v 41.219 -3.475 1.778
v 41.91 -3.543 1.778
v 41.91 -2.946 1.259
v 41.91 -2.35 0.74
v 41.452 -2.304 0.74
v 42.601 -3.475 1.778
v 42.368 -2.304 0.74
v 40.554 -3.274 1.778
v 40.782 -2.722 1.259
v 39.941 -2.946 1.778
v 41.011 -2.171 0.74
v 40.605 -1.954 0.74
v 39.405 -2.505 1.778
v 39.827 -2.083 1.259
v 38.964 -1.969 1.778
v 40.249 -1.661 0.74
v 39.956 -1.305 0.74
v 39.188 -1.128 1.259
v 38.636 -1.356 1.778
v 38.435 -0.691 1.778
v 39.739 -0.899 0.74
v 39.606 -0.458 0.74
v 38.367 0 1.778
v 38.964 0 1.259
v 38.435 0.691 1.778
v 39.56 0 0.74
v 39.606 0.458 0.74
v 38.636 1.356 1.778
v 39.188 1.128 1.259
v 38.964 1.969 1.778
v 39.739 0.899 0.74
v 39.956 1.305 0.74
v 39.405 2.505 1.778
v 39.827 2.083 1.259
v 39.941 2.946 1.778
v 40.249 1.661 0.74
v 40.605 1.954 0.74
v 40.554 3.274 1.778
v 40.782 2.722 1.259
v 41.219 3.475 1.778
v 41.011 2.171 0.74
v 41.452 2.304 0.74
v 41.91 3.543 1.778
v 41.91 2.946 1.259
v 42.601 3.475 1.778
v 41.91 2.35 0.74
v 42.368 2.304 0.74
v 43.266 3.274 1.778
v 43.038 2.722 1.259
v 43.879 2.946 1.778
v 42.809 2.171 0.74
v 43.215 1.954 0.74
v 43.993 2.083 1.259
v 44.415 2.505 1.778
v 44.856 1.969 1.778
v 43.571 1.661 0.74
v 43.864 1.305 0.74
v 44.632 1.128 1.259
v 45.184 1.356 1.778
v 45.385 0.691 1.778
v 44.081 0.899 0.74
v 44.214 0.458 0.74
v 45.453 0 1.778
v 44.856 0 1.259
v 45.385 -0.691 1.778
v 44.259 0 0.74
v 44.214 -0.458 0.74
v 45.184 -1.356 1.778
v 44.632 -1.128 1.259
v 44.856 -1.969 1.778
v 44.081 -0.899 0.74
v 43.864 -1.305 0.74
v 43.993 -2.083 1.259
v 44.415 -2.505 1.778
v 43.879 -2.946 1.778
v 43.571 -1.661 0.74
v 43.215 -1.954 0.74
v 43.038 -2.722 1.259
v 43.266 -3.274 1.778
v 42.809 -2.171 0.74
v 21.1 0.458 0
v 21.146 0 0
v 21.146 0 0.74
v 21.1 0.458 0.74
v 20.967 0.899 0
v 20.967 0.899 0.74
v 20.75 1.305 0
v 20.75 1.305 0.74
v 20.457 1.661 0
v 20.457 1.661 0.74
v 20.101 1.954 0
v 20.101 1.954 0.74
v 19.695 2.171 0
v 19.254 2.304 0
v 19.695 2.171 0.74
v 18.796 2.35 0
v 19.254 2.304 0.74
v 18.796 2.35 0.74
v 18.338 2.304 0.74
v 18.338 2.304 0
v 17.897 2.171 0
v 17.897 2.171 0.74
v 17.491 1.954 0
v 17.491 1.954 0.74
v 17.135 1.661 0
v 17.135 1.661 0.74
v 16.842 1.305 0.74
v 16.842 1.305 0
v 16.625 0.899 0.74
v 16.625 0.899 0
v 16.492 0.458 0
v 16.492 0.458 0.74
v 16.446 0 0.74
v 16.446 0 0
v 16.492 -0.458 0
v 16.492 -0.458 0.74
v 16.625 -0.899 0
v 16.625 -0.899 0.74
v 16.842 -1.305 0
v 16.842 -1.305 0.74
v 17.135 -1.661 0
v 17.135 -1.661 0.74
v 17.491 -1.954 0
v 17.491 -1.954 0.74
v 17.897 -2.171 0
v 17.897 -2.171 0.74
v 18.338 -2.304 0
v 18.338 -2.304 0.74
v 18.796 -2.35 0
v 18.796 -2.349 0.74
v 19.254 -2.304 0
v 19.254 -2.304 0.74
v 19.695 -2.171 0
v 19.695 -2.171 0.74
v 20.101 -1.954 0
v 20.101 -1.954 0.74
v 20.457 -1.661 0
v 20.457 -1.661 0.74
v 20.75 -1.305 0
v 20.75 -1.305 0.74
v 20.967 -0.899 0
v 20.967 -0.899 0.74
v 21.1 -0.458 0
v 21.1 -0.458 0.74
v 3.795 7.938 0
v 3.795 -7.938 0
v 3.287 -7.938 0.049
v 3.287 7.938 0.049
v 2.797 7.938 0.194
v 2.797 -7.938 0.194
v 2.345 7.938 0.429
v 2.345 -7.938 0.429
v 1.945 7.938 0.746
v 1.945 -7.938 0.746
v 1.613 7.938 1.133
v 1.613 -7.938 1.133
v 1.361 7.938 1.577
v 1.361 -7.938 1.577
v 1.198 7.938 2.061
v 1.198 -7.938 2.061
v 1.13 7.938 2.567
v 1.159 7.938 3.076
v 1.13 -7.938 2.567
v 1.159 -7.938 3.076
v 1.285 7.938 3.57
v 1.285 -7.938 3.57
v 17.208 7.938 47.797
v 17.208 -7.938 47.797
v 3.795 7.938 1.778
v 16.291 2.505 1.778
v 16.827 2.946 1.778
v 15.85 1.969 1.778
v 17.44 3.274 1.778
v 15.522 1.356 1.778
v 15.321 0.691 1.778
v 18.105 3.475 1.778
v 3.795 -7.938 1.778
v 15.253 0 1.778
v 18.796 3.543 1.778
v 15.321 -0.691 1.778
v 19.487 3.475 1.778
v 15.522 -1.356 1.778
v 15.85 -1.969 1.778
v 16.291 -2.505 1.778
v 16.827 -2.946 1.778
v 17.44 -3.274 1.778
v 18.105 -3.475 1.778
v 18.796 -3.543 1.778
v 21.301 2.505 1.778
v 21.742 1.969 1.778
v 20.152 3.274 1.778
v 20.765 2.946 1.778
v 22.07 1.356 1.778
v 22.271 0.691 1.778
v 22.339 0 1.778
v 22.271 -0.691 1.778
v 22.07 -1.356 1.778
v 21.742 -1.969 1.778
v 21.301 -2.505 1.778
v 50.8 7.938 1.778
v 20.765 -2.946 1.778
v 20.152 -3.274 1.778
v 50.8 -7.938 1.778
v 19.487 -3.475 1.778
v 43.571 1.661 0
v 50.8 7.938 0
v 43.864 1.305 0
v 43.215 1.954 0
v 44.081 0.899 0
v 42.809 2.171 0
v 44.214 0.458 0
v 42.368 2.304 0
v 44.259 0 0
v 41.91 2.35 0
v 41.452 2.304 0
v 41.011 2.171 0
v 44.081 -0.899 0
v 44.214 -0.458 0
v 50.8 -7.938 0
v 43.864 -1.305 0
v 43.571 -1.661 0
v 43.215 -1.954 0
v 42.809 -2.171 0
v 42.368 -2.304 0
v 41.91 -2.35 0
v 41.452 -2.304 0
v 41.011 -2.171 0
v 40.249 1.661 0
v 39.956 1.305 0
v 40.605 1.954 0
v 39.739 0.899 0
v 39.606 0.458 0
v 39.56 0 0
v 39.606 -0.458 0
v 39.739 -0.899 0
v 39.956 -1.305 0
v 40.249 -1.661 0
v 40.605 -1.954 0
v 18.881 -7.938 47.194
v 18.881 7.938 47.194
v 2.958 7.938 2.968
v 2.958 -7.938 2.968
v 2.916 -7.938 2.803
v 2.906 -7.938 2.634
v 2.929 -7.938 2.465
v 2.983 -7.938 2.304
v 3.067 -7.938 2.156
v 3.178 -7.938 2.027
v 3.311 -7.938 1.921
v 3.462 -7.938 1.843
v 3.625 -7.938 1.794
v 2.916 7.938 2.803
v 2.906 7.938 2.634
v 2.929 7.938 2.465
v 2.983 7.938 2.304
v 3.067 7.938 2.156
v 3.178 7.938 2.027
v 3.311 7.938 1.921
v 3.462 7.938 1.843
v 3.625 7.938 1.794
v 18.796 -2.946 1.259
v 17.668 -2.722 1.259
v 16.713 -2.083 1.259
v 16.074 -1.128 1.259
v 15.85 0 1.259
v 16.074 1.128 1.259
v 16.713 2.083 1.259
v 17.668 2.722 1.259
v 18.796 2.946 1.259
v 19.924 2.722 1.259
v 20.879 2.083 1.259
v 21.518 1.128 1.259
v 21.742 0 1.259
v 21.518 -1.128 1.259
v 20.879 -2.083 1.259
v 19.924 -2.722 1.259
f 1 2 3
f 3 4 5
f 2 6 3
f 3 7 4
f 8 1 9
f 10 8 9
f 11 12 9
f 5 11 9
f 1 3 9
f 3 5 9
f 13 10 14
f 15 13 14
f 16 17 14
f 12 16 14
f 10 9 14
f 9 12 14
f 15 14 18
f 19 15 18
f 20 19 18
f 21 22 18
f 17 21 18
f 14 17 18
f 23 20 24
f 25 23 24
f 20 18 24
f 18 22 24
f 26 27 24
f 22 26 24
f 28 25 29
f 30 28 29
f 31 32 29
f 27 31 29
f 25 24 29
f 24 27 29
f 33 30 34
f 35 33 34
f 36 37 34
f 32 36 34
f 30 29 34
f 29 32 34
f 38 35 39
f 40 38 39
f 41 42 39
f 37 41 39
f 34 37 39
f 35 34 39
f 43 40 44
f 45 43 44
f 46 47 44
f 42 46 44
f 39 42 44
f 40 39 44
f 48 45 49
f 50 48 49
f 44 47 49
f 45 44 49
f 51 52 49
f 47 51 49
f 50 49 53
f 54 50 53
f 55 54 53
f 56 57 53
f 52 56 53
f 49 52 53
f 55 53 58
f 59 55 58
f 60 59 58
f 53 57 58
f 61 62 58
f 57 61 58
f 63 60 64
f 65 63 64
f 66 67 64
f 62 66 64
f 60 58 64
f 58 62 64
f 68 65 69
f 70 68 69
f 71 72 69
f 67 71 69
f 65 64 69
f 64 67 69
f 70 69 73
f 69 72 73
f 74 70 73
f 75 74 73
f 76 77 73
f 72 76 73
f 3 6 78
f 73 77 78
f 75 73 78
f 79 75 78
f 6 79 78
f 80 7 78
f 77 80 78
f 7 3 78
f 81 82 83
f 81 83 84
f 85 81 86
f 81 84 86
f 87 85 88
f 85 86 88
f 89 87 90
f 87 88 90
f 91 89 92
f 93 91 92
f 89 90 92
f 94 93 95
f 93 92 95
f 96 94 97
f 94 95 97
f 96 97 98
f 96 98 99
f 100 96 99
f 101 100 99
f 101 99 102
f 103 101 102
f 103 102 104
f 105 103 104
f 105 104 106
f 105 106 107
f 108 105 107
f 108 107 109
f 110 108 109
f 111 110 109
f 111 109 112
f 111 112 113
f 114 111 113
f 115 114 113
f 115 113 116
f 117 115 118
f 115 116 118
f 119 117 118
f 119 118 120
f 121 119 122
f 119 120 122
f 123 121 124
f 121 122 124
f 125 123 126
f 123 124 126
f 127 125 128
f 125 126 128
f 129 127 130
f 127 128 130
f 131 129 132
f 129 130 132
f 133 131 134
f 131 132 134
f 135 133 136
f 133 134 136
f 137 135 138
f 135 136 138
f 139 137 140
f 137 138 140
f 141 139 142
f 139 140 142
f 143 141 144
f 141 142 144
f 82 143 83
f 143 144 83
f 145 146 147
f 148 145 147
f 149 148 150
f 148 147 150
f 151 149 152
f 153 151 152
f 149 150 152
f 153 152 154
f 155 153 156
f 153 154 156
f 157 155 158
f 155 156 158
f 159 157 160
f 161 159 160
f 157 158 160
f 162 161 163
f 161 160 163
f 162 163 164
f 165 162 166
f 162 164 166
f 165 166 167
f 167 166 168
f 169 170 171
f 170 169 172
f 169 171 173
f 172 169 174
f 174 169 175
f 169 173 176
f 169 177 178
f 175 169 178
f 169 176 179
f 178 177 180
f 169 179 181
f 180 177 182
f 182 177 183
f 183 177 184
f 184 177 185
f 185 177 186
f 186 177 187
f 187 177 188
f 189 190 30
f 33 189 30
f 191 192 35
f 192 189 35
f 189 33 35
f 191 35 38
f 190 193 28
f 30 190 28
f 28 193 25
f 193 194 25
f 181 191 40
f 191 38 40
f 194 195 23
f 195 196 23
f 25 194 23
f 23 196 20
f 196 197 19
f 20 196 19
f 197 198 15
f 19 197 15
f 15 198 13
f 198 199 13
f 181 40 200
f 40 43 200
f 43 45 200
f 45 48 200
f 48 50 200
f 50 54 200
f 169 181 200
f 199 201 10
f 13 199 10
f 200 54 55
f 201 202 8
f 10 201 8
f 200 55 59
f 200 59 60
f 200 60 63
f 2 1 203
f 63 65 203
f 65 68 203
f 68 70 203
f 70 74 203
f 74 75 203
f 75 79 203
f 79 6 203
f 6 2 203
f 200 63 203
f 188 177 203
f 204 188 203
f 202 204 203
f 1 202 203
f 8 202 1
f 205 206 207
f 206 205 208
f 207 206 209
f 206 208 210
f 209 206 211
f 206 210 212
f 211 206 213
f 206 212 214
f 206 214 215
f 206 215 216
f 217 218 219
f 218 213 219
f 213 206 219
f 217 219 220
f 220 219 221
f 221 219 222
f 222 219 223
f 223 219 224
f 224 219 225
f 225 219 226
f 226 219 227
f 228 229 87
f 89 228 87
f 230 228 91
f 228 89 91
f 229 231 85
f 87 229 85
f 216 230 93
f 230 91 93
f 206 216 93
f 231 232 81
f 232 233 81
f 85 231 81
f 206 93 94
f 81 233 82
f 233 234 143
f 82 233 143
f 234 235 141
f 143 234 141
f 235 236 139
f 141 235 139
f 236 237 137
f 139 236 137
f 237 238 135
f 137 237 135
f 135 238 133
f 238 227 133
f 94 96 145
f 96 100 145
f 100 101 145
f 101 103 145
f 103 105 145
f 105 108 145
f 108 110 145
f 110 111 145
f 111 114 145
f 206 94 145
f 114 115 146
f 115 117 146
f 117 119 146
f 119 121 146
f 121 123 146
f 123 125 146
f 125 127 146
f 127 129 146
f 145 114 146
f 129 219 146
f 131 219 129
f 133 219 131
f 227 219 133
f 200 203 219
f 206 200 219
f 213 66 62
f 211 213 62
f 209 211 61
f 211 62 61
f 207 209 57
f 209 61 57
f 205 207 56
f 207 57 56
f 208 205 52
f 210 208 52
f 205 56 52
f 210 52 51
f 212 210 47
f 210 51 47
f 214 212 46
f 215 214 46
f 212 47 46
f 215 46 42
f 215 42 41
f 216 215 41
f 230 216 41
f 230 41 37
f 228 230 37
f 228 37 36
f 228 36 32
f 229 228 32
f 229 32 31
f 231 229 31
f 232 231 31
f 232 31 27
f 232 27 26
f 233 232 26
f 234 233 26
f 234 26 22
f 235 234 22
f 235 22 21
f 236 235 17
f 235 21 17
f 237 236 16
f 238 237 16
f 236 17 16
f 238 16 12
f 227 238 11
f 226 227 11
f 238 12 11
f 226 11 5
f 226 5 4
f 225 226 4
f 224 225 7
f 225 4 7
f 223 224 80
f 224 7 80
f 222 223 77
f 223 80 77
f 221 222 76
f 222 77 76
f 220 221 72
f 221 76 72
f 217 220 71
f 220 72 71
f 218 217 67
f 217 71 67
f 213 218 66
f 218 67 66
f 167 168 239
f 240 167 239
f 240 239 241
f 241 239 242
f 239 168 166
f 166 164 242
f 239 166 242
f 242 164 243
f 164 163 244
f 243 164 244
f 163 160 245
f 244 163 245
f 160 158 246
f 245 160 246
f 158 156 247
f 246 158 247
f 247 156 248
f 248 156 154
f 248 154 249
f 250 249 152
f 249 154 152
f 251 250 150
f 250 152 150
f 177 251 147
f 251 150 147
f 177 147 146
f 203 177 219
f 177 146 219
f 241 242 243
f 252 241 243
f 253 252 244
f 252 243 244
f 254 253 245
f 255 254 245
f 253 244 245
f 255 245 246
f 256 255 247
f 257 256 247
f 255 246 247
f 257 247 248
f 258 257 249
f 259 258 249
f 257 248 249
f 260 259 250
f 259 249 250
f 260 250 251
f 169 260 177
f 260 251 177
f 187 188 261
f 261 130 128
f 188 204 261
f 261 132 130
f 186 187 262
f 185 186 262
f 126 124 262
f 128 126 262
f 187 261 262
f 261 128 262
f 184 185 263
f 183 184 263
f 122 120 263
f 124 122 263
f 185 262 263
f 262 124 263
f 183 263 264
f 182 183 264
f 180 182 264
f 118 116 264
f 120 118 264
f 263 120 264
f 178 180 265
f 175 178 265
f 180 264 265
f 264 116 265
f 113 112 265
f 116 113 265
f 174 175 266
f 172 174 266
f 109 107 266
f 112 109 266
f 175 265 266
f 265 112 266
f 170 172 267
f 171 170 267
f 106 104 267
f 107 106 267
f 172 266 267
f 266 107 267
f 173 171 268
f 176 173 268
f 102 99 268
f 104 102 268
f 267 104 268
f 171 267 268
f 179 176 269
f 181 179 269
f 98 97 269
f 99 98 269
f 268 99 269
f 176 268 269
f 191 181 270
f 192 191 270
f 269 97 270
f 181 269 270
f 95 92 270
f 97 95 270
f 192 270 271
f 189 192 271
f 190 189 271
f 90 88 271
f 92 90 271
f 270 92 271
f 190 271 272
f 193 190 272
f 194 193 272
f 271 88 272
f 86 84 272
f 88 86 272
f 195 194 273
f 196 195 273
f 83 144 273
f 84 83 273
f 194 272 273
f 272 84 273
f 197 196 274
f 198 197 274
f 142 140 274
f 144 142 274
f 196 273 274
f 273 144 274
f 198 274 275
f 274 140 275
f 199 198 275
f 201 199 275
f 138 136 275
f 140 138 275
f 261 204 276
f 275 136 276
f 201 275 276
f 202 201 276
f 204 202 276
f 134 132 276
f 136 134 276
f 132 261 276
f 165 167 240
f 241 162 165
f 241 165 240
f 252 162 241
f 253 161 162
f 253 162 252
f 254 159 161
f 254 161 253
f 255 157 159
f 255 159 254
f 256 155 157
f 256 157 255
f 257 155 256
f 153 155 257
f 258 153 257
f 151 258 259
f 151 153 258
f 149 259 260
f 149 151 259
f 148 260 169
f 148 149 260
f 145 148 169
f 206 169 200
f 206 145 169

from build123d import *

# Parameters (mm, degrees)
EXTRUDE_THIN1_START = -7.9375
EXTRUDE_THIN1_DEPTH = 15.875
SKETCH4_R           = 2.3495
EXTRUDE3_DEPTH      = 67.428185443


# Read off the part's stored shape, not the designer's step: Extrude-Thin1
with BuildPart() as part:
    # Extrude-Thin1 outline → Extrude-Thin1 (new body)
    with BuildSketch(Plane(origin=(0, 0, 0), x_dir=(1, 0, 0), z_dir=(0, 1, 0)).offset(EXTRUDE_THIN1_START)):
        with BuildLine():
            Line((3.79480894, -1.778), (50.8, -1.778))
            Line((50.8, -1.778), (50.8, 0))
            Line((50.8, 0), (3.79480894, 0))
            ThreePointArc((3.79480894, 0), (1.6127938, -1.133475), (1.285491529, -3.57044625))
            Line((1.285491529, -3.57044625), (17.2085, -47.79652213))
            Line((17.2085, -47.79652213), (18.881378275, -47.19422463))
            Line((18.881378275, -47.19422463), (2.958369803, -2.96814875))
            ThreePointArc((2.958369803, -2.96814875), (3.06747056, -2.155825), (3.79480894, -1.778))
        make_face()
    extrude(amount=EXTRUDE_THIN1_DEPTH)

    # Sketch4 → Extrude3 (cut, through all)
    with BuildSketch(Plane(origin=(3.556, 0, 1.778), x_dir=(1, 0, 0), z_dir=(0, 0, 1))):
        with Locations((38.354, 0)):
            Circle(SKETCH4_R)
        with Locations((15.24, 0)):
            Circle(SKETCH4_R)
    extrude(amount=-EXTRUDE3_DEPTH, mode=Mode.SUBTRACT)

    # Cut-Extrude1 cone 1 section (through the dimple's axis) → Cut-Extrude1 (revolve, cut)
    with BuildSketch(Plane(origin=(41.91, 0, 1.778), x_dir=(0, -1, 0), z_dir=(1, 0, 0))):
        Polygon((0, 0), (3.5433, 0), (0, 3.080143698), align=None)
    revolve(axis=Axis((41.91, 0, 1.778), (0, 0, -1)), mode=Mode.SUBTRACT)

    # Cut-Extrude1 cone 2 section (through the dimple's axis) → Cut-Extrude1 cone 2 (revolve, cut)
    with BuildSketch(Plane(origin=(18.796, 0, 1.778), x_dir=(0, -1, 0), z_dir=(1, 0, 0))):
        Polygon((0, 0), (3.5433, 0), (0, 3.080143698), align=None)
    revolve(axis=Axis((18.796, 0, 1.778), (0, 0, -1)), mode=Mode.SUBTRACT)


solid = part.part
